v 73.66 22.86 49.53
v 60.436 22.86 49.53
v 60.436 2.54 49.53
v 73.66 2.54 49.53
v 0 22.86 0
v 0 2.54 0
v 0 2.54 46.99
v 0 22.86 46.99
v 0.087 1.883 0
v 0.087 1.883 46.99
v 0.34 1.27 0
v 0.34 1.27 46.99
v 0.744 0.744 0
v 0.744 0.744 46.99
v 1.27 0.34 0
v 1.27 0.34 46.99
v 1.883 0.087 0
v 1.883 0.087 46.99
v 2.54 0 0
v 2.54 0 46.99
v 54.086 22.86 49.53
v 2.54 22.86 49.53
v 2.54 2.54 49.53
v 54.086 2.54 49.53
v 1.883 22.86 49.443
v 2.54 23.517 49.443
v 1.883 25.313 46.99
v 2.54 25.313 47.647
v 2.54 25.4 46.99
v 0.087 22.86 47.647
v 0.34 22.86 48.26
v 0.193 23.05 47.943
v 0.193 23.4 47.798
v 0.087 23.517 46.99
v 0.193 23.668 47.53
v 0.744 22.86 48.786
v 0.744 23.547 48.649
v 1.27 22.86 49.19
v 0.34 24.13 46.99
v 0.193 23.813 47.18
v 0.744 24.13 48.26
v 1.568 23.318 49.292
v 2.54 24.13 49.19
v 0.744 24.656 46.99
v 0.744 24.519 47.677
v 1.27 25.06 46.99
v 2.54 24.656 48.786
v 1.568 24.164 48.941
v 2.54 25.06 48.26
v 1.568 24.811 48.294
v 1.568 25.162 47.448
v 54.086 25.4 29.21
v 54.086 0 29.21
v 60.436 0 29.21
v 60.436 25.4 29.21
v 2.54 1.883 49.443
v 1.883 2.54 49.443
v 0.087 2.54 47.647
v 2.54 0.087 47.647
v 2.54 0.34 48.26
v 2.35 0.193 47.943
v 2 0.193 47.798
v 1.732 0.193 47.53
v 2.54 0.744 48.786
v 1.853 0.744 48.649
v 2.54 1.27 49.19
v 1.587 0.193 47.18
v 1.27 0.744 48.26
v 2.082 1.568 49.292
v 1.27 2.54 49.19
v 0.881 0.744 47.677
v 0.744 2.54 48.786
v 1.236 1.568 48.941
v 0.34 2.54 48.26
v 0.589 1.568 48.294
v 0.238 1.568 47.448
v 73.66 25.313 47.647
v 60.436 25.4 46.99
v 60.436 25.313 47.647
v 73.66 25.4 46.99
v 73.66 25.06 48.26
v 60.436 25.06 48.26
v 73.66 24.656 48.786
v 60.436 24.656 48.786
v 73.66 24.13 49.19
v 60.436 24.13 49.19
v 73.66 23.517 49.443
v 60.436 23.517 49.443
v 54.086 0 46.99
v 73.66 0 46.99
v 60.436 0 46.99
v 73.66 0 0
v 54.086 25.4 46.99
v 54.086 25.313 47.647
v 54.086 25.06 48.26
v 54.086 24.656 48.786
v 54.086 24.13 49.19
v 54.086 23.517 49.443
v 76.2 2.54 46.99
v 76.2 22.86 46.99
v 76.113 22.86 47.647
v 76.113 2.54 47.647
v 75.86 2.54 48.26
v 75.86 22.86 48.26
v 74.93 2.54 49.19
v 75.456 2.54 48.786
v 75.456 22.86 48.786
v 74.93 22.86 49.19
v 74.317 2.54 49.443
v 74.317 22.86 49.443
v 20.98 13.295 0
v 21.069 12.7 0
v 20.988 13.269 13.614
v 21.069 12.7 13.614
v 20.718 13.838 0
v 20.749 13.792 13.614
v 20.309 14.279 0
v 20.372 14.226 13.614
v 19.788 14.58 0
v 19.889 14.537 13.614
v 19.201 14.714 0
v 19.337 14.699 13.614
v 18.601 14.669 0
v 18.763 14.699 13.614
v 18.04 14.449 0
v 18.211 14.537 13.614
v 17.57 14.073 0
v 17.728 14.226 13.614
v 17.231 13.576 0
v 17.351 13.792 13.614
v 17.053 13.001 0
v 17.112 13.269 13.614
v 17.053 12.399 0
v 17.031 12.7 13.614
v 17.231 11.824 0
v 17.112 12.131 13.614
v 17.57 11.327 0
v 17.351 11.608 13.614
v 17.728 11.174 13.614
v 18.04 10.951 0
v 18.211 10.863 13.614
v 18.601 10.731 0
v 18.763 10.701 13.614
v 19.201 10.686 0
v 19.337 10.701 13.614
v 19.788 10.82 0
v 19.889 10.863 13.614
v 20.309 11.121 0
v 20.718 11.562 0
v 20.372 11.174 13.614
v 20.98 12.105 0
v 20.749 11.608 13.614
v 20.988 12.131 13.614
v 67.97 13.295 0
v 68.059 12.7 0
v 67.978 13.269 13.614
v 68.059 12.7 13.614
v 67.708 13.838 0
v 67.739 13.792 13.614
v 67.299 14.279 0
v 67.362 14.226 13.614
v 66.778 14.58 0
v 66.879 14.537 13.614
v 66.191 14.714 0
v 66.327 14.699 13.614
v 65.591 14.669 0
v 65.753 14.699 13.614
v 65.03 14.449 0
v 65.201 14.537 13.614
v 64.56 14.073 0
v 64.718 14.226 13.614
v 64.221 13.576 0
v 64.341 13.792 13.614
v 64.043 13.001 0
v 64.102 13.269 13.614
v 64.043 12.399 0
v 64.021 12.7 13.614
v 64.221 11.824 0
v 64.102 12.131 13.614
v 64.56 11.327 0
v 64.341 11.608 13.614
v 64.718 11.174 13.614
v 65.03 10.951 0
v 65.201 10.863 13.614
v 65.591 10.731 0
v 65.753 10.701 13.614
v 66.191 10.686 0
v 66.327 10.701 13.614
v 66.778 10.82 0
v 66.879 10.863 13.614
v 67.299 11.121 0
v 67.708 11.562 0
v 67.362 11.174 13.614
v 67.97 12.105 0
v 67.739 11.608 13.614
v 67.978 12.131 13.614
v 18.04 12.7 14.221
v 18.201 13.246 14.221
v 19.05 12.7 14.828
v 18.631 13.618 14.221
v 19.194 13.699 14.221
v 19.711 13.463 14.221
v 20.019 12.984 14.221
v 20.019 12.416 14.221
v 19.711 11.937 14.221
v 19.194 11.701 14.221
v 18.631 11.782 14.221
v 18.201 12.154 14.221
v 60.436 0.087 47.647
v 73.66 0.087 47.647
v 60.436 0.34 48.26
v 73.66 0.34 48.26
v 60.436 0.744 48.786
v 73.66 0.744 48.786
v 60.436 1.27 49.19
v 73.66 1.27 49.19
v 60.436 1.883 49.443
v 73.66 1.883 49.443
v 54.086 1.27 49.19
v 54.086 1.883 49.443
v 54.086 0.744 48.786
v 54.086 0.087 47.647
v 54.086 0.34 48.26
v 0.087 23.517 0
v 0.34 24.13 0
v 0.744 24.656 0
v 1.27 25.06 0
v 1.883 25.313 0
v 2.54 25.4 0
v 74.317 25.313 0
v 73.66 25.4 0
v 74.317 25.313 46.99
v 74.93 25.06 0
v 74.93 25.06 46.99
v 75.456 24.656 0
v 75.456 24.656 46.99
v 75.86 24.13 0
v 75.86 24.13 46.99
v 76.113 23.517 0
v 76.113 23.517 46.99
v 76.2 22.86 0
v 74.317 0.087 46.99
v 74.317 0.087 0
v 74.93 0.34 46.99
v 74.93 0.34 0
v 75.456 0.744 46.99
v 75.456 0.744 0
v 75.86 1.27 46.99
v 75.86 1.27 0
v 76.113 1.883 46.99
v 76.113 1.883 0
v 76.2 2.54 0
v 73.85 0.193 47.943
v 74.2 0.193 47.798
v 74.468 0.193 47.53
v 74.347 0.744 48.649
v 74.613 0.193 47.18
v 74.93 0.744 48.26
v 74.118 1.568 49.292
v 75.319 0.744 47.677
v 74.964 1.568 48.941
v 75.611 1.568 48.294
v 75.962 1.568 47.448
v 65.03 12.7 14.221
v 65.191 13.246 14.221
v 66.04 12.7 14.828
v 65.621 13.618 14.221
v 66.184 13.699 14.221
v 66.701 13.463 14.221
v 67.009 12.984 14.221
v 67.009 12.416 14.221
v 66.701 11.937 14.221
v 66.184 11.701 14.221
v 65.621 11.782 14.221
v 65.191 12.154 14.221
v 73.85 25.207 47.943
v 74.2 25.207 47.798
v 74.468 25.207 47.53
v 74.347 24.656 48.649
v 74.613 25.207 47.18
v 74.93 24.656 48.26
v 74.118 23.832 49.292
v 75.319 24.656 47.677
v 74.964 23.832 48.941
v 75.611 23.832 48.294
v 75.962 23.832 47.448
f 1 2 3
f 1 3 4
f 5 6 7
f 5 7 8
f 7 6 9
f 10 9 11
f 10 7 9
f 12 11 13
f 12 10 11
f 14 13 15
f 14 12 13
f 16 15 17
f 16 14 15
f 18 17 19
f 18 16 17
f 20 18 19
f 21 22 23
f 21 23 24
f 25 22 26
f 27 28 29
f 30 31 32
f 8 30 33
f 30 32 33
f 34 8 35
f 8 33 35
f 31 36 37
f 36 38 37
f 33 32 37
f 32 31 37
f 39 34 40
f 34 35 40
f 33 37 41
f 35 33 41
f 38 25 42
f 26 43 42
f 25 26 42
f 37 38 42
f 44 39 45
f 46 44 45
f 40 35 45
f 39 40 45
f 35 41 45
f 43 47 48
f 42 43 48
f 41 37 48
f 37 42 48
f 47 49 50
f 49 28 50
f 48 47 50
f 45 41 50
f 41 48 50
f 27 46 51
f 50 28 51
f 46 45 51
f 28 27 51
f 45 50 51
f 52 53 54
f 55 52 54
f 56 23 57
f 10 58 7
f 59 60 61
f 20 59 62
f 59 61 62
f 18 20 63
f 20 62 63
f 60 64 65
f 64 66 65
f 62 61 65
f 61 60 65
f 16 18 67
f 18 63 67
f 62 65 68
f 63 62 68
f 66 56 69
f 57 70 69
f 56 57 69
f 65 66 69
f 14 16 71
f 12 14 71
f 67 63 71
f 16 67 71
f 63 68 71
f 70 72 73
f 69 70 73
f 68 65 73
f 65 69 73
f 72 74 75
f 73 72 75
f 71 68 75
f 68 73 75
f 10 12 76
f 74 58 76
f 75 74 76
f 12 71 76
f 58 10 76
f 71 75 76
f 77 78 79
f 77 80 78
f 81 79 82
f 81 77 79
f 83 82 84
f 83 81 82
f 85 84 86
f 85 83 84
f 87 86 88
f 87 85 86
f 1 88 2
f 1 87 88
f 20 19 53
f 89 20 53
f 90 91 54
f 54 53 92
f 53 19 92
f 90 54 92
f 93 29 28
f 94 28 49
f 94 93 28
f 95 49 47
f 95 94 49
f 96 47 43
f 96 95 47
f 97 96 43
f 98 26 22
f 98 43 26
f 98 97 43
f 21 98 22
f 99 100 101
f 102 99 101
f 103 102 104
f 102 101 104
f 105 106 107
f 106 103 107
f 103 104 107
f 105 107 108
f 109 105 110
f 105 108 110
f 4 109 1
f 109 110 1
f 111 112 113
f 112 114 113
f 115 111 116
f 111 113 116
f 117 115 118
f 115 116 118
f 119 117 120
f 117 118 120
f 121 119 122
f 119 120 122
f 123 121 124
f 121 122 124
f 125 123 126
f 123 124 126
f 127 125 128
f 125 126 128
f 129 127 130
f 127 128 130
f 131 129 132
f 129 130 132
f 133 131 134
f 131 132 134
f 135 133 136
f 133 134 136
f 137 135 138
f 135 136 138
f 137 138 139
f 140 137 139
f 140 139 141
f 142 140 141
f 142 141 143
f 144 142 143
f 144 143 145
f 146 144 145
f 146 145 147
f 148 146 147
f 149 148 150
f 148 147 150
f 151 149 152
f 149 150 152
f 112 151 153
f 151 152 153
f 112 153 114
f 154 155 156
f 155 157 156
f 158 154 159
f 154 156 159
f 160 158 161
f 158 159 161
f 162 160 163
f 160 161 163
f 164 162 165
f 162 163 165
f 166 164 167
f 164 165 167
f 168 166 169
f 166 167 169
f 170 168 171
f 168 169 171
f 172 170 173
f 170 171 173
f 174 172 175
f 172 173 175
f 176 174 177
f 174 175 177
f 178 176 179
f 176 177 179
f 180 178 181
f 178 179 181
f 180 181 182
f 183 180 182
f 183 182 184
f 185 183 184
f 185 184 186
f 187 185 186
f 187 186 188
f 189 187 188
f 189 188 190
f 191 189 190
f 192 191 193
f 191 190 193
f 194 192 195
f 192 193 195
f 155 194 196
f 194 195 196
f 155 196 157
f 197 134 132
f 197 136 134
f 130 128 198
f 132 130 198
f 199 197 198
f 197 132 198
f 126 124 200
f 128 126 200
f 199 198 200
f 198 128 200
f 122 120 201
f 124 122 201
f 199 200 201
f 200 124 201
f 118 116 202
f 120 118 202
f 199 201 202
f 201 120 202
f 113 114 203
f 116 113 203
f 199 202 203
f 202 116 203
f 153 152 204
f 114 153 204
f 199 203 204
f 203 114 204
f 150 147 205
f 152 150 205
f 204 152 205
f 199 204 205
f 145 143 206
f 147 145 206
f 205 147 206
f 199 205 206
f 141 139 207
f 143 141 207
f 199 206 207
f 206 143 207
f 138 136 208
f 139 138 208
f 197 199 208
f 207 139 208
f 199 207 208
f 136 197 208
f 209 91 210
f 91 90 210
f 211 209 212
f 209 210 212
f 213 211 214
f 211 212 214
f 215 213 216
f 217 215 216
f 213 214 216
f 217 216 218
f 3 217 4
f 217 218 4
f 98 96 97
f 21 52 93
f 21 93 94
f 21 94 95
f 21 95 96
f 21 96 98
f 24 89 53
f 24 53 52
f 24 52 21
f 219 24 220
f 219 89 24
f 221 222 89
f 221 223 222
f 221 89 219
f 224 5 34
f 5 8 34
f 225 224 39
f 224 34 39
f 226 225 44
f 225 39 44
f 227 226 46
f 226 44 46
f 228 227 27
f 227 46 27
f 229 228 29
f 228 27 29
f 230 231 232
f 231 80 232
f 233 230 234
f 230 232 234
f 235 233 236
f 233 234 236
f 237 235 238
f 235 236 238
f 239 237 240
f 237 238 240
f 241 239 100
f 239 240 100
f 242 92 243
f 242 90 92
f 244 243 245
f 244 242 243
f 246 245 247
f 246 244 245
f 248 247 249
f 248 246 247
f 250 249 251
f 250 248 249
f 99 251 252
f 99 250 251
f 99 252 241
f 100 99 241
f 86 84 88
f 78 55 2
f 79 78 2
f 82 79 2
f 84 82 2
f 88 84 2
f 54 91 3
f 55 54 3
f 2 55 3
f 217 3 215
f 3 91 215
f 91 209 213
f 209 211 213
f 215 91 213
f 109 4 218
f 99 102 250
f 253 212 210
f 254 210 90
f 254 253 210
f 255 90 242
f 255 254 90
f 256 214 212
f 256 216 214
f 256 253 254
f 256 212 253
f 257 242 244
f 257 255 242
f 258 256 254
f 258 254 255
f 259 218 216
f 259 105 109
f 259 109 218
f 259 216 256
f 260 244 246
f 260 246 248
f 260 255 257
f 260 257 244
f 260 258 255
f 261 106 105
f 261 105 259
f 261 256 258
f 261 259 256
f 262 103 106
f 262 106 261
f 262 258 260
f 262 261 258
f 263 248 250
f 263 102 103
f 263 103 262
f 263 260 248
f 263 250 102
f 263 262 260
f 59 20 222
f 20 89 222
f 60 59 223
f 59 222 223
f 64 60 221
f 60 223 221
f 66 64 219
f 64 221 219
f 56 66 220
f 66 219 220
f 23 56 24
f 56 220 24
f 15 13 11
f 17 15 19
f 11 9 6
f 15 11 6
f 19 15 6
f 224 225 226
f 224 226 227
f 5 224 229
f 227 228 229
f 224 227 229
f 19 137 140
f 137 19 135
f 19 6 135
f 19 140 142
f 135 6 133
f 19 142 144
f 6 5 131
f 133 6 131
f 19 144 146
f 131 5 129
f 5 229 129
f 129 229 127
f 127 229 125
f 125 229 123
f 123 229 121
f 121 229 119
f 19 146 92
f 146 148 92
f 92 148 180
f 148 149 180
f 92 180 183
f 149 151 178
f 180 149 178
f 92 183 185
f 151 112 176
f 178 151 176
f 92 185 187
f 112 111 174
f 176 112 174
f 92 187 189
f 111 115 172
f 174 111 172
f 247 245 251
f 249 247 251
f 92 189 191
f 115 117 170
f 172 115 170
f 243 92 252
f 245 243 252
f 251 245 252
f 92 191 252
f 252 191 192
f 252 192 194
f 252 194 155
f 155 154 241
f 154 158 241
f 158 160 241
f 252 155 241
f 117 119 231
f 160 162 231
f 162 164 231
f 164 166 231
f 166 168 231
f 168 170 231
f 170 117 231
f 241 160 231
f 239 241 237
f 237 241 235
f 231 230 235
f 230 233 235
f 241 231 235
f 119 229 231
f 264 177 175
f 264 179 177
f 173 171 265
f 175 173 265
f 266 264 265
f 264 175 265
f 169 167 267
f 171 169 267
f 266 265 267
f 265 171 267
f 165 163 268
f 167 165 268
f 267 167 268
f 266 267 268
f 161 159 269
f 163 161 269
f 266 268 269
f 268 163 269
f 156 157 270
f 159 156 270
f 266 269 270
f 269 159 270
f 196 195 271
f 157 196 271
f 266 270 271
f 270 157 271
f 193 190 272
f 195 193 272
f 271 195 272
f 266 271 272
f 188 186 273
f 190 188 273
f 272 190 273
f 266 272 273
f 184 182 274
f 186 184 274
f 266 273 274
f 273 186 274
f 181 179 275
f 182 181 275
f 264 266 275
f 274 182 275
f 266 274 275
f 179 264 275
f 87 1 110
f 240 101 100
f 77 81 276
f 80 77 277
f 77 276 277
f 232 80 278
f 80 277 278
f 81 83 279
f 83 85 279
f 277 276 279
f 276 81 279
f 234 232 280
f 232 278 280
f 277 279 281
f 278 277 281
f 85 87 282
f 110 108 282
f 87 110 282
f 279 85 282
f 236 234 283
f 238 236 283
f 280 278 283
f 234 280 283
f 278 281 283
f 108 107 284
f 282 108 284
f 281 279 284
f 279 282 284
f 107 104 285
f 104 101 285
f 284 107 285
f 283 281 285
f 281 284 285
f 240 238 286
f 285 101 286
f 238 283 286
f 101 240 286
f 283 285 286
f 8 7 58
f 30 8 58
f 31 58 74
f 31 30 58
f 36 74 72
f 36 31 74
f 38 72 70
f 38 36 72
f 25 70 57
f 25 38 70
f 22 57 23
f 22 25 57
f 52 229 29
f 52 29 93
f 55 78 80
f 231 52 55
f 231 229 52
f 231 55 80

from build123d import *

# Parameters (mm, degrees)
SKETCH1_W                  = 76.2
SKETCH1_H                  = 25.4
EXTRUDE1_DEPTH             = 49.53
SKETCH2_W                  = 6.35
SKETCH2_H                  = 20.32
EXTRUDE2_DEPTH             = 95.36535858
FILLET1_R                  = 2.54
F_10_32_TAPPED_HOLE1_D     = 4.0386
F_10_32_TAPPED_HOLE1_DEPTH = 13.6144
F_10_32_TAPPED_HOLE1_TIP   = 1.213317848


with BuildPart() as part:
    # Sketch1 → Extrude1 (new body)
    with BuildSketch(Plane.XY):
        with Locations((38.1, 12.7)):
            Rectangle(SKETCH1_W, SKETCH1_H)
    extrude(amount=EXTRUDE1_DEPTH)

    # Sketch2 → Extrude2 (cut, through all)
    with BuildSketch(Plane.XZ):
        with Locations((57.260871328, 39.37)):
            Rectangle(SKETCH2_W, SKETCH2_H)
    extrude(amount=-EXTRUDE2_DEPTH, mode=Mode.SUBTRACT)

    # Fillet1
    fillet1_edges = [part.edges().sort_by_distance(p)[0] for p in [
        (76.2, 12.7, 49.53),
        (68.317935664, 25.4, 49.53),
        (68.317935664, 0, 49.53),
        (27.042935664, 25.4, 49.53),
        (0, 12.7, 49.53),
        (27.042935664, 0, 49.53),
        (0, 25.4, 24.765),
        (76.2, 25.4, 24.765),
        (76.2, 0, 24.765),
        (0, 0, 24.765),
    ]]
    fillet(fillet1_edges, radius=FILLET1_R)

    # #10-32 Tapped Hole1
    with Locations(Plane(origin=(66.04, 12.7, 0), x_dir=(-1, 0, 0), z_dir=(0, 0, -1))):
        with Locations((0, 0), (46.99, 0)):
            Hole(F_10_32_TAPPED_HOLE1_D / 2, depth=F_10_32_TAPPED_HOLE1_DEPTH)
            with Locations((0, 0, -(F_10_32_TAPPED_HOLE1_DEPTH + F_10_32_TAPPED_HOLE1_TIP / 2))):  # 118° drill point
                Cone(0, F_10_32_TAPPED_HOLE1_D / 2, F_10_32_TAPPED_HOLE1_TIP, mode=Mode.SUBTRACT)


solid = part.part
